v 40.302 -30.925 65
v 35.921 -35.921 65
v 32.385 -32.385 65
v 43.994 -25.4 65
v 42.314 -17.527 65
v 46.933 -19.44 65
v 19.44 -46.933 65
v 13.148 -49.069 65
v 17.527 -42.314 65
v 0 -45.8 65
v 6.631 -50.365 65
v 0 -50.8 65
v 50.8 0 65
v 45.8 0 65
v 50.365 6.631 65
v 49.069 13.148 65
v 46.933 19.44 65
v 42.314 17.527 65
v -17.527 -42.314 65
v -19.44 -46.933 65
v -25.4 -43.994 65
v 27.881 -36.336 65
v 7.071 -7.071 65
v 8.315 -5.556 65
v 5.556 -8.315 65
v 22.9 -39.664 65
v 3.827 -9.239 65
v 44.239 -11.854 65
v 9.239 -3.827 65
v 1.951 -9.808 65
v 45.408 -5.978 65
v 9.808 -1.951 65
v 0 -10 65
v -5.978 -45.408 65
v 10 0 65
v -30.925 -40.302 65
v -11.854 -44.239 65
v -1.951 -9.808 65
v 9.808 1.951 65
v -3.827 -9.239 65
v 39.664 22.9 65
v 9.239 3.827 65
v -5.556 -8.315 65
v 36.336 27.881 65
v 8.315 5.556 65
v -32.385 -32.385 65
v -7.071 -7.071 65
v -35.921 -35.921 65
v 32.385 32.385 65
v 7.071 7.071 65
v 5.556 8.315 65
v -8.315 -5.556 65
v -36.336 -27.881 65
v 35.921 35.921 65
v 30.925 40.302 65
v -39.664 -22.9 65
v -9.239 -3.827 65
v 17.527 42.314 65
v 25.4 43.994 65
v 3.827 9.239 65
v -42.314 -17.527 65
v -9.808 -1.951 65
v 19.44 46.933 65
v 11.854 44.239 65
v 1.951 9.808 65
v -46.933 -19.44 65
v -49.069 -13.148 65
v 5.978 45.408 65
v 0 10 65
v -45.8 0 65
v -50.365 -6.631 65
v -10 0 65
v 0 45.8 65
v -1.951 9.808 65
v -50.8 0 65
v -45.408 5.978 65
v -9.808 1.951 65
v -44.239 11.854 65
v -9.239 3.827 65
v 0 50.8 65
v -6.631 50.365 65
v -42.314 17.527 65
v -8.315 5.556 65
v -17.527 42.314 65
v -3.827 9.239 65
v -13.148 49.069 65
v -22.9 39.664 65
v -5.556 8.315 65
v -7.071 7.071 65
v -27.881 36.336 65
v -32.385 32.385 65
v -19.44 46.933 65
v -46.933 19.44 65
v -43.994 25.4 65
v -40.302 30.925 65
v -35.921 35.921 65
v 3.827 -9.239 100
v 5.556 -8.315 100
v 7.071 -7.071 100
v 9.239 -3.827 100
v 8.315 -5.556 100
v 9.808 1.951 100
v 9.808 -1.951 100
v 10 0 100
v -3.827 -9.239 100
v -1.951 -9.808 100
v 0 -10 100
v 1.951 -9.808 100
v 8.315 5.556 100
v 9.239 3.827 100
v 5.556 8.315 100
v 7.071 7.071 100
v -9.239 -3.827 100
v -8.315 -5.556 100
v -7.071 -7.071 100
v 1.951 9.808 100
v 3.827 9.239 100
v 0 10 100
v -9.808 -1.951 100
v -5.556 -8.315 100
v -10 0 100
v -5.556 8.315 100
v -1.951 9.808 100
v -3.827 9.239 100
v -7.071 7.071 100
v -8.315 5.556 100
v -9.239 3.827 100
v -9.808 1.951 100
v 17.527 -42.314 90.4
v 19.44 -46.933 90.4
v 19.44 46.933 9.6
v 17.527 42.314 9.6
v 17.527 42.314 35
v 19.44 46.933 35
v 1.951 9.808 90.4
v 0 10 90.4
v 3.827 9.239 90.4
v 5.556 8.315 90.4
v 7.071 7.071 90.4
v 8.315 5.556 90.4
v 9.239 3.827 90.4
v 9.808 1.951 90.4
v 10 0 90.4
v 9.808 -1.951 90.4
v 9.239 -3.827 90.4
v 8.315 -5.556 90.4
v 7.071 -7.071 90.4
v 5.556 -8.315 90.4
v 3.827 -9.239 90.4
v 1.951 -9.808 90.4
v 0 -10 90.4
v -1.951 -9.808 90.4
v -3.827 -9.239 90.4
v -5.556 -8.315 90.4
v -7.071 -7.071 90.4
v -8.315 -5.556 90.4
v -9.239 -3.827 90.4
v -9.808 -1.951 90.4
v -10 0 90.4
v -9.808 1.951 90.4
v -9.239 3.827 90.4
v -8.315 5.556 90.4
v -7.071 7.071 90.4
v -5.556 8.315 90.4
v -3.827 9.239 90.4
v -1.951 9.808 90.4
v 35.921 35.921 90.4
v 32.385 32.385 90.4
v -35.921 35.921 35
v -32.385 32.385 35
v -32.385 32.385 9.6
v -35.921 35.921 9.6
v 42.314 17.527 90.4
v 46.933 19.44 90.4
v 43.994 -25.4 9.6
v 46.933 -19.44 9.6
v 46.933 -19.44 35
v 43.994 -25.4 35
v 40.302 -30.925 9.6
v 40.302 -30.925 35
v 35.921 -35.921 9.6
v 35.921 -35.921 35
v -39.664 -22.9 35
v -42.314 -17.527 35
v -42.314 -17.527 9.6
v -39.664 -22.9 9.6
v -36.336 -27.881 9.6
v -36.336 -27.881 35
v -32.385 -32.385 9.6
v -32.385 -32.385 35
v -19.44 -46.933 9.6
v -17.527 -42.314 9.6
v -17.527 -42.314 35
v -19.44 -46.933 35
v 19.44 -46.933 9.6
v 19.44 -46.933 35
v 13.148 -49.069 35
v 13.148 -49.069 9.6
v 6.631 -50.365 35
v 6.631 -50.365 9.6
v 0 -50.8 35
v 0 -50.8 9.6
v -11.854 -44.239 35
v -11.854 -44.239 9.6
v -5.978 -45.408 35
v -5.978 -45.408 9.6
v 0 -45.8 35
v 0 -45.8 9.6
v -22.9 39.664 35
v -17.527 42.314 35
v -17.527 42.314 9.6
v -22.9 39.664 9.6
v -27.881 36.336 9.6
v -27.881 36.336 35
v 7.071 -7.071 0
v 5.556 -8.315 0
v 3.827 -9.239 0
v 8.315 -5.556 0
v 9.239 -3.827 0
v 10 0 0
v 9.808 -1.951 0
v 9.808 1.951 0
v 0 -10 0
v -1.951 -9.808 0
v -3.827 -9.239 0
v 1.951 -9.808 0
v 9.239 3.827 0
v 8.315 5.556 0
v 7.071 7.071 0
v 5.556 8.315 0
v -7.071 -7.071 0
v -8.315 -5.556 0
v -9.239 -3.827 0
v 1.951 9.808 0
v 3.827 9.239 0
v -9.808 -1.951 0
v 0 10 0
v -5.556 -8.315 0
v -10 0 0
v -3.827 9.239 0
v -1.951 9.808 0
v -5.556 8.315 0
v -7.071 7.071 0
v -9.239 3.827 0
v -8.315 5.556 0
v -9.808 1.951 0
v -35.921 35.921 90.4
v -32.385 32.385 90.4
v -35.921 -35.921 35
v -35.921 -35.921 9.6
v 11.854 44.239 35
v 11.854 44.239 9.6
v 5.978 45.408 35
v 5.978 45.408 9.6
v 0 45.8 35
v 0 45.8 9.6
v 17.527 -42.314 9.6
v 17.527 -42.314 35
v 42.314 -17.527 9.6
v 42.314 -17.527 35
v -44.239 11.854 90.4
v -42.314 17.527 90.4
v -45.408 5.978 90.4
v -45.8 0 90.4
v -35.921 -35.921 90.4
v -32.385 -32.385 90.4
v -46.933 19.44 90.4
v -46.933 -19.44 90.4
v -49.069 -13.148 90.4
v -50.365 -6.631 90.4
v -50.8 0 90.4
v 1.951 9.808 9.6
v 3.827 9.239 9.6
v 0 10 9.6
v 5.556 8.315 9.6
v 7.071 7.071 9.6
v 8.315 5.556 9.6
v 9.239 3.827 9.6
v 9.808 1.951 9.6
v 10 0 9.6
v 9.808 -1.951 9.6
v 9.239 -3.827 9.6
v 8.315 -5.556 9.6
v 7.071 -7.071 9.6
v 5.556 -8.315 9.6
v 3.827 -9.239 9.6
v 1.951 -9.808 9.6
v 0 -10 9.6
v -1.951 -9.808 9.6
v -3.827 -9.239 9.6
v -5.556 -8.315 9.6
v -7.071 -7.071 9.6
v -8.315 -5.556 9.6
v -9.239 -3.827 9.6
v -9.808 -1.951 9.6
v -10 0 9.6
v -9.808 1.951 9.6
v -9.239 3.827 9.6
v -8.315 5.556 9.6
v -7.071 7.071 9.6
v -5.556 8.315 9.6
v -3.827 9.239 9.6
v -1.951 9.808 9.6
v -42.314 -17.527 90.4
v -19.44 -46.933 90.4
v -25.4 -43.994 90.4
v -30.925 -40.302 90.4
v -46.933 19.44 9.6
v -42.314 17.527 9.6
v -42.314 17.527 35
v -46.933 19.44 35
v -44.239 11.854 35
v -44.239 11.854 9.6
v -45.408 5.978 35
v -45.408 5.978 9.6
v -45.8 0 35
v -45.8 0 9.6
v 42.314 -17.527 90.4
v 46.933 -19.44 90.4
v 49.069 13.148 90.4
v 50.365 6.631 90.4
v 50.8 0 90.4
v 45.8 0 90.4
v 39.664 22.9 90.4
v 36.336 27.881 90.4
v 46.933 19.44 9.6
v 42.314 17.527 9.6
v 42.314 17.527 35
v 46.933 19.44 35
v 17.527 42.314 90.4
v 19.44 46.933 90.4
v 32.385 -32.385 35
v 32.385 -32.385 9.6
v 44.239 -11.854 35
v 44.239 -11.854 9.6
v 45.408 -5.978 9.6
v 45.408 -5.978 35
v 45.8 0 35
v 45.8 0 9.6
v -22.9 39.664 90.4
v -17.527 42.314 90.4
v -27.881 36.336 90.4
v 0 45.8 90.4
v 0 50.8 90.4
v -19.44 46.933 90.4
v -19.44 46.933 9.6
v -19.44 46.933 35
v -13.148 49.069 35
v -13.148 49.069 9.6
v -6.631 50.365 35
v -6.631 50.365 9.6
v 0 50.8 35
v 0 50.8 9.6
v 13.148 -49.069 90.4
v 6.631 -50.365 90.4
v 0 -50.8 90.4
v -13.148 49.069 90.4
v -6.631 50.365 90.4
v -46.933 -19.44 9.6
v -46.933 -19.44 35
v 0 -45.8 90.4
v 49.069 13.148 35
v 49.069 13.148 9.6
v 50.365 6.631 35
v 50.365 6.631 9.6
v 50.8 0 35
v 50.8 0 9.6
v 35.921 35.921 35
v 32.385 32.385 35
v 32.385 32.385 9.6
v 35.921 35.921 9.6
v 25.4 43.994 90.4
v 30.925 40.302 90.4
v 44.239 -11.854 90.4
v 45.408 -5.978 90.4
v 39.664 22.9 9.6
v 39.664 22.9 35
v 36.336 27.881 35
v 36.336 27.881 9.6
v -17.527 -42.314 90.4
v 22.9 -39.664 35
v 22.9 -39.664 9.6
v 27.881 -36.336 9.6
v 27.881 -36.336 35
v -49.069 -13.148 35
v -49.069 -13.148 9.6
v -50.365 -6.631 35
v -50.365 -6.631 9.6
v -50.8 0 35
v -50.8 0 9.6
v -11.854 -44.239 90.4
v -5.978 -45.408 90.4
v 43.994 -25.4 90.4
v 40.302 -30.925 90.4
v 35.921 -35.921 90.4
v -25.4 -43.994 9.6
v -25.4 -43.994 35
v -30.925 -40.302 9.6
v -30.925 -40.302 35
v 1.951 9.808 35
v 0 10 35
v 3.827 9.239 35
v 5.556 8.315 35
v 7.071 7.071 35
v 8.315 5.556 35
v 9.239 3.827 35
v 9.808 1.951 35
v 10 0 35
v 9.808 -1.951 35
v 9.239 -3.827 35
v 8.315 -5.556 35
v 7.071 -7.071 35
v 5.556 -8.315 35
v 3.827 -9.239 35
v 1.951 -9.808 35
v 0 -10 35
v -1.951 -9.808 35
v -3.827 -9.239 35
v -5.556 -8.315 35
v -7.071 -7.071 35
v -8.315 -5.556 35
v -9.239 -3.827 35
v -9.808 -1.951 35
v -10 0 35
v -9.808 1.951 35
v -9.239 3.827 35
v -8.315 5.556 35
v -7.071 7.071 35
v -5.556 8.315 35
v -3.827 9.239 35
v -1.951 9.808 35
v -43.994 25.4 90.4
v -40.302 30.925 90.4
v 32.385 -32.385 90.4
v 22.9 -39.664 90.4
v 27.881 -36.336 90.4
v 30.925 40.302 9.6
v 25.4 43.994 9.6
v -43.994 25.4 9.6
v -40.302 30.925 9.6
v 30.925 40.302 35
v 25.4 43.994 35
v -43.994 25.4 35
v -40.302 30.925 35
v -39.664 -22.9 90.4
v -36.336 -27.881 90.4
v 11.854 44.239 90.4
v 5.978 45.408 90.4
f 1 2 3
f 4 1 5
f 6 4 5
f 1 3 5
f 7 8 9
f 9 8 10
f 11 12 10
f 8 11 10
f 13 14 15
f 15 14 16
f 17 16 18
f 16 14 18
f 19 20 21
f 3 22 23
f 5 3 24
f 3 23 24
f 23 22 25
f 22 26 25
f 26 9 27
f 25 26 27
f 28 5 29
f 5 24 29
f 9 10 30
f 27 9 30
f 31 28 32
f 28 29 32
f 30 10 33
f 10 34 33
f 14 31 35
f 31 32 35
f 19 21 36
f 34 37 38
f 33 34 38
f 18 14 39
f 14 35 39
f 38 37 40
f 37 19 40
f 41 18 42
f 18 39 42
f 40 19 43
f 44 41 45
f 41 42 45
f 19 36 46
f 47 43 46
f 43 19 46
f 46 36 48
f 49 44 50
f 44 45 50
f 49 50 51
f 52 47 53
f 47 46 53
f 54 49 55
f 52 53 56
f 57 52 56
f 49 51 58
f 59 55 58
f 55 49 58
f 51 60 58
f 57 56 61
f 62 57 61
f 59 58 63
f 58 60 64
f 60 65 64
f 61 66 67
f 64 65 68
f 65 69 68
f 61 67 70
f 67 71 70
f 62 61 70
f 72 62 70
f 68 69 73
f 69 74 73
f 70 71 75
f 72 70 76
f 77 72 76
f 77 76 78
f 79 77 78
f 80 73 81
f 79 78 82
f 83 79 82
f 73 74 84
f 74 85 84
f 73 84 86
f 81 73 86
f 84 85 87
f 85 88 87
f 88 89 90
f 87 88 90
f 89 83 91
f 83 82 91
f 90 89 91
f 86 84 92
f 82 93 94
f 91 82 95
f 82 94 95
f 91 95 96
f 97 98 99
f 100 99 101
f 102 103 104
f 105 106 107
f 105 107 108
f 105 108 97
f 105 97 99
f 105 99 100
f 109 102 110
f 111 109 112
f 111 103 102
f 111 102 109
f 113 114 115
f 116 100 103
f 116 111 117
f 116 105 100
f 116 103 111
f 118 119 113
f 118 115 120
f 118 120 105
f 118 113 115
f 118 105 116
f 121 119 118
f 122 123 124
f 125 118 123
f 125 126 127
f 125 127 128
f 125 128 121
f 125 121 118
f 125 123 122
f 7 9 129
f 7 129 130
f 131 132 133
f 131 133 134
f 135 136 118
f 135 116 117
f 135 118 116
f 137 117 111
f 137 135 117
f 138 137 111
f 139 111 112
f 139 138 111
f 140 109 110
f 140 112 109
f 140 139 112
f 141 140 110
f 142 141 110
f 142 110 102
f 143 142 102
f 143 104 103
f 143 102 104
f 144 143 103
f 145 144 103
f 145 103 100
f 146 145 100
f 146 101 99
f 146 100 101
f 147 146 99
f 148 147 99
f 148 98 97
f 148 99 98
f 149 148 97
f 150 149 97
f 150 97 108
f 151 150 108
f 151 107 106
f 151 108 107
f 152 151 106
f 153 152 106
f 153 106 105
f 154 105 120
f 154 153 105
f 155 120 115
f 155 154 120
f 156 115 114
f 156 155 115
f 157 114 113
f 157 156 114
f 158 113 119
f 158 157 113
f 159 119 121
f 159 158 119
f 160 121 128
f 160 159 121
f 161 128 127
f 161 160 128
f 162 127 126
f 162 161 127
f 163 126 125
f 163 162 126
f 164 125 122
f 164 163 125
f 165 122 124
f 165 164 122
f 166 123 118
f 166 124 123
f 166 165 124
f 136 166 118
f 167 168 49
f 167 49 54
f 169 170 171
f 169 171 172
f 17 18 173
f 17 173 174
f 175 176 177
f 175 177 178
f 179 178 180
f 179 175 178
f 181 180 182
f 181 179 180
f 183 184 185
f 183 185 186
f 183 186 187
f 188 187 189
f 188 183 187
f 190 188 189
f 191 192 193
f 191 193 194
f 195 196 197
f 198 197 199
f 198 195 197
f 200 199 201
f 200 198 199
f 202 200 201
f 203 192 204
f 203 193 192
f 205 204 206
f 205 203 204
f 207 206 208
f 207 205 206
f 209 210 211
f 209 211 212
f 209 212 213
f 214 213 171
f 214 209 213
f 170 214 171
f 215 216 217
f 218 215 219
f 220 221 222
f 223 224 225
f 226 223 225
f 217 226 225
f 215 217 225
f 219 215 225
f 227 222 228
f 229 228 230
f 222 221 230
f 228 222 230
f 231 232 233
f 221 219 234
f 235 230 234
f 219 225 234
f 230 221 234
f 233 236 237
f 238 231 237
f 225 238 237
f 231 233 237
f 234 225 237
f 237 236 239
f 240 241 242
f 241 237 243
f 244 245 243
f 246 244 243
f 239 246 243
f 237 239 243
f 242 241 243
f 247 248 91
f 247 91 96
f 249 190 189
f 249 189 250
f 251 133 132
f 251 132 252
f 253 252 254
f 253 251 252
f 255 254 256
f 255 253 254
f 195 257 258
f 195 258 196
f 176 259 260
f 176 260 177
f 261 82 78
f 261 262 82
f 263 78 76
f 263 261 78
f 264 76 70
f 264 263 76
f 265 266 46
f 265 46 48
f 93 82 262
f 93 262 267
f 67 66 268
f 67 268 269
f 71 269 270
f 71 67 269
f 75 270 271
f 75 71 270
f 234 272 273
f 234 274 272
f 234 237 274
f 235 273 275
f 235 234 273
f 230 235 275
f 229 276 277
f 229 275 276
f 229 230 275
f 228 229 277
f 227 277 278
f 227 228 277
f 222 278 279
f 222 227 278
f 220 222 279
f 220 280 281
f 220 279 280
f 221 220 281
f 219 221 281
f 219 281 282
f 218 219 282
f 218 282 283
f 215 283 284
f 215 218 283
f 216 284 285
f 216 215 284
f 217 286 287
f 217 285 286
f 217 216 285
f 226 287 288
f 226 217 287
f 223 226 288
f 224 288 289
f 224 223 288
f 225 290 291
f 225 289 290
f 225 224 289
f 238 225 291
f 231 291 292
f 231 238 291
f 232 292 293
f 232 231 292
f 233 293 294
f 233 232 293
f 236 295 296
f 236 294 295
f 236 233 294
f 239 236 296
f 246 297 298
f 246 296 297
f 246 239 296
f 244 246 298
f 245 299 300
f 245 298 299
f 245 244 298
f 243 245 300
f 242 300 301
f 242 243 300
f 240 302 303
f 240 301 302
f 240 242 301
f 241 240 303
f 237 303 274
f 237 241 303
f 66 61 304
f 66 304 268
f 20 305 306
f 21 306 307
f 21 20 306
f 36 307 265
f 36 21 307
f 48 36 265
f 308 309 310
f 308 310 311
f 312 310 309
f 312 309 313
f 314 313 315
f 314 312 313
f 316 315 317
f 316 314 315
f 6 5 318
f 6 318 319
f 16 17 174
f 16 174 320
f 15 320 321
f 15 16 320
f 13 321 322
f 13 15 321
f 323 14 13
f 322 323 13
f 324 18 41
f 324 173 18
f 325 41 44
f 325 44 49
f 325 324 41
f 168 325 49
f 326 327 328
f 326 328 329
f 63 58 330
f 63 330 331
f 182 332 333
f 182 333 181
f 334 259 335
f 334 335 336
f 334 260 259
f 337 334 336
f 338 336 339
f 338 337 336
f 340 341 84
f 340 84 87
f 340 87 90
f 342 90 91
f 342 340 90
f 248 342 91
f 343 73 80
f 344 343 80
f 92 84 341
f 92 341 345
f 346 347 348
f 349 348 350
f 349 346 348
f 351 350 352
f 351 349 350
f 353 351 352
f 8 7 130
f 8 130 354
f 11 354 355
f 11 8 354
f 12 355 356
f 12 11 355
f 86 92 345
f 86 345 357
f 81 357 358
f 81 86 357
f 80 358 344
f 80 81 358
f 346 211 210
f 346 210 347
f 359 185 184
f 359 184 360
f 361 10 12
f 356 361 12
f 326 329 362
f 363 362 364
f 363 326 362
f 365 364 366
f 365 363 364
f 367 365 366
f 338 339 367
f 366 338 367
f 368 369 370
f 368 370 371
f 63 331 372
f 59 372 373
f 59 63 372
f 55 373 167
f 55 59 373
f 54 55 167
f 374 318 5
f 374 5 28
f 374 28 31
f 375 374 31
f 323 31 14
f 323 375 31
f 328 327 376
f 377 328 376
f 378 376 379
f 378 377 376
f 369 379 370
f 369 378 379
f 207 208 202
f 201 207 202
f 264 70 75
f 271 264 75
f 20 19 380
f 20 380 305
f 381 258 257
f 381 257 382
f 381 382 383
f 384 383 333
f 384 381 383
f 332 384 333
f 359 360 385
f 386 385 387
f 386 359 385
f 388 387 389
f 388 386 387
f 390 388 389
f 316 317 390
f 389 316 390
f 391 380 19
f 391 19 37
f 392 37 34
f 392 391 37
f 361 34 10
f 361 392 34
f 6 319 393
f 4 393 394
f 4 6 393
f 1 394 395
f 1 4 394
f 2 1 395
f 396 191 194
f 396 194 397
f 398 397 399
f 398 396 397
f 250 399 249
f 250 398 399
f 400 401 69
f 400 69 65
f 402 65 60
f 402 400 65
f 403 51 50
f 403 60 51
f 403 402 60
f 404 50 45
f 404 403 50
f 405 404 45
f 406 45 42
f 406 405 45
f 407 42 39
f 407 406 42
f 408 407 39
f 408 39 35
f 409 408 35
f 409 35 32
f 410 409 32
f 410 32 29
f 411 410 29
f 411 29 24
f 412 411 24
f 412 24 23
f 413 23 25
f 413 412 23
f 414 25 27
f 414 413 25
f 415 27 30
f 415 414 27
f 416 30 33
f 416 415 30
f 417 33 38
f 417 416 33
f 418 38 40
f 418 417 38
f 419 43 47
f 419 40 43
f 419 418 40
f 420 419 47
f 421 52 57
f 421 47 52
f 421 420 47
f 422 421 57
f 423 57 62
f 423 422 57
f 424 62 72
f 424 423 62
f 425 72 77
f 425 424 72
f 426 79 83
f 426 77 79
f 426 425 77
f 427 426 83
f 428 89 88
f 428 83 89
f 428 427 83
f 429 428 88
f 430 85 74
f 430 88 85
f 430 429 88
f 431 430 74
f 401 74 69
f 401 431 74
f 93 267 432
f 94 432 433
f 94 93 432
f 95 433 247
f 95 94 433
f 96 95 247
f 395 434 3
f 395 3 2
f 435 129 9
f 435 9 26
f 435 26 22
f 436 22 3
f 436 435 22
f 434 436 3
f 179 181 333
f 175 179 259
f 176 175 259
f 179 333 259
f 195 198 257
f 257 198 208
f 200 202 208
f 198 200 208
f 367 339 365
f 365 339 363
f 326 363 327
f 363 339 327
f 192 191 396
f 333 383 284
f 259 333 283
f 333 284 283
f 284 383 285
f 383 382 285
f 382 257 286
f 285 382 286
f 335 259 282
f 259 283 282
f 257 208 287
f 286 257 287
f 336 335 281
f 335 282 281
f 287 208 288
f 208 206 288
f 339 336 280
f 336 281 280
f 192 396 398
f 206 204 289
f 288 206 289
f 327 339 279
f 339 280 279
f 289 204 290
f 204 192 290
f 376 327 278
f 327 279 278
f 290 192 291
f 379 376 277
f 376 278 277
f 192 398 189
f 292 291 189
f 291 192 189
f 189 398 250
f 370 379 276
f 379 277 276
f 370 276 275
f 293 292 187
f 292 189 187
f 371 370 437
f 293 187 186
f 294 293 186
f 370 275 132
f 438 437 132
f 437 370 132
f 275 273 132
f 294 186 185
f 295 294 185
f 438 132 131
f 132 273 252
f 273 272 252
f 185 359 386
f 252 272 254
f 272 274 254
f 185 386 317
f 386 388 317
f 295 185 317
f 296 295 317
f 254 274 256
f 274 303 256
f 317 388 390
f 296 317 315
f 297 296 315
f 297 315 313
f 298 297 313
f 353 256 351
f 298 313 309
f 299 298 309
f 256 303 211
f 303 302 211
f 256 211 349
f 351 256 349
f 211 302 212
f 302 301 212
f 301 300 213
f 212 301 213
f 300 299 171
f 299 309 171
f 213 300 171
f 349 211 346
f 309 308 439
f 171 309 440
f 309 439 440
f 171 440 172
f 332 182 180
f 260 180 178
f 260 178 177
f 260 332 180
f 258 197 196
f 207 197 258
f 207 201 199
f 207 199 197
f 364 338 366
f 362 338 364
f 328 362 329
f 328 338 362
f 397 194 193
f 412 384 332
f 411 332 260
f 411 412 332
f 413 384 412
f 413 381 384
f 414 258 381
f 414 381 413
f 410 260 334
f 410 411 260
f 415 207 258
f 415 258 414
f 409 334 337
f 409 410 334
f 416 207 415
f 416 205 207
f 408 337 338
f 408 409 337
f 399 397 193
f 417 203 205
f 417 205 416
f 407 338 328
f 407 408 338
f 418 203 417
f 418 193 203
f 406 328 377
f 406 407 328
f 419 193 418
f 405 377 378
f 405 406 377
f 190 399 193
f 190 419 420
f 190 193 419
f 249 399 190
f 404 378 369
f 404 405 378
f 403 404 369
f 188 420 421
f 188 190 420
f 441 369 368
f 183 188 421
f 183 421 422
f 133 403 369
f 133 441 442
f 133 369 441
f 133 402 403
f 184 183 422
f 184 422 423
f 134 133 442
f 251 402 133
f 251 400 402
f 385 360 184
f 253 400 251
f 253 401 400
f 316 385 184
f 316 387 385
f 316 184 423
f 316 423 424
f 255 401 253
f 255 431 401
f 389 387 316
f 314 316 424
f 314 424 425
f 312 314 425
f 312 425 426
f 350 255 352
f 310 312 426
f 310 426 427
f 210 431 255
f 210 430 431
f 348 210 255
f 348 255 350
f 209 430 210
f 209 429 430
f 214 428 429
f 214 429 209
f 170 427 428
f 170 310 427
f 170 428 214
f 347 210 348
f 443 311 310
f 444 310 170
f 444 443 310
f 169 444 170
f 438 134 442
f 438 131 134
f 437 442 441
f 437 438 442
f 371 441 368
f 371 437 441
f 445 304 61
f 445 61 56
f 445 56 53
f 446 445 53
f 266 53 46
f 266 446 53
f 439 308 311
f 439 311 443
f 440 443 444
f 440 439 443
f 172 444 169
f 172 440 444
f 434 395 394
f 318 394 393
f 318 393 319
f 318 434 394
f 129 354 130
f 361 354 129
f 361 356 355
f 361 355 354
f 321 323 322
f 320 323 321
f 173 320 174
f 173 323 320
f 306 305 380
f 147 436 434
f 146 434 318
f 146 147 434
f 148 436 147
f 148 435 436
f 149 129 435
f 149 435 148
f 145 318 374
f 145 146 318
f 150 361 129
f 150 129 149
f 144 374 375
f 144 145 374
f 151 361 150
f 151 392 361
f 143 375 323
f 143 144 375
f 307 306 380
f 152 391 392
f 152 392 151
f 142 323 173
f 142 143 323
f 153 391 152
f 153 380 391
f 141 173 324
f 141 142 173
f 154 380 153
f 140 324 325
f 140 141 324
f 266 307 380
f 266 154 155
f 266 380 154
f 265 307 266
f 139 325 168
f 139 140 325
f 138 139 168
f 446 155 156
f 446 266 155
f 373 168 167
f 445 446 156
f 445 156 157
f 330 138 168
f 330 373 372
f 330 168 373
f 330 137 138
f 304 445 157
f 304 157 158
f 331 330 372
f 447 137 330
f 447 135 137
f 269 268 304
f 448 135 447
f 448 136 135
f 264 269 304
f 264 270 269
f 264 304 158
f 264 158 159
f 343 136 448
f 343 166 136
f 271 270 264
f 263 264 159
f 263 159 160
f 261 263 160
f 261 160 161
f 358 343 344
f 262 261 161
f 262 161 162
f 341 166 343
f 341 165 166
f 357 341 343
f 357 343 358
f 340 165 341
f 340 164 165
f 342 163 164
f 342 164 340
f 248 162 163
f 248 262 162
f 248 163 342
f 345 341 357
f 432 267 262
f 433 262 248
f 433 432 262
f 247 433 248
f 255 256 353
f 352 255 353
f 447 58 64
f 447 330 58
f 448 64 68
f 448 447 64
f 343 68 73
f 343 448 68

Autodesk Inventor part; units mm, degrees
ref_plane "YZ Plane" through (0, 0, 0) normal (1, 0, 0) x (0, 1, 0)
ref_plane "XZ Plane" through (0, 0, 0) normal (0, 1, 0) x (-1, 0, 0)
ref_plane "XY Plane" through (0, 0, 0) normal (0, 0, 1) x (1, 0, 0)
sketch "Esboço1" plane through (0, 0, 0) normal (1, 0, 0) x (0, 1, 0)
  line L0 (0, 0) -> (0, 100)
  line L1 (0, 100) -> (10, 100)
  line L2 (10, 100) -> (10, 90.4)
  line L3 (10, 90.4) -> (50.8, 90.4)
  line L4 (50.8, 90.4) -> (50.8, 65)
  line L5 (50.8, 65) -> (10, 65)
  line L6 (10, 65) -> (10, 35)
  line L7 (10, 35) -> (50.8, 35)
  line L8 (50.8, 35) -> (50.8, 9.6)
  line L9 (50.8, 9.6) -> (10, 9.6)
  line L10 (10, 9.6) -> (10, 0)
  line L11 (10, 0) -> (0, 0)
  line L12 (0, 50) -> (10, 50)
  dimension "d0" = 10
  dimension "d1" = 100
  dimension "d2" = 25.4
  dimension "d3" = 25.4
  dimension "d4" = 15
  dimension "d5" = 15
  dimension "d6" = 50.8
revolve "Revolução1" add sketch "Esboço1" angle 360 about axis through (0, 0, 0) along (0, 0, 1)
thread "Rosca1" size "M1060x8" class "6g" standard "ANSI Metric M Profile" full length
thread "Rosca2" size "M105x6" class "6g" standard "ANSI Metric M Profile" full length
sketch "Esboço4" plane through (0, 0, 90.4) normal (0, 0, 1) x (1, 0, 0)
  circle A0 centre (0, 0) radius 10 projected
  circle A1 centre (0, 0) radius 50.8 projected
  line L0 (0, 0) -> (0, 50.8)
  line L1 (0, 0) -> (0, -50.8)
  line L2 (0, 0) -> (50.8, 0)
  line L3 (0, 0) -> (-50.8, 0)
  line L4 (0, 0) -> (-35.921, 35.921)
  line L5 (0, 0) -> (-19.4403, 46.9331)
  line L6 (0, 0) -> (-46.9331, 19.4403)
  line L7 (0, 0) -> (35.921, 35.921)
  line L8 (0, 0) -> (19.4403, 46.9331)
  line L9 (0, 0) -> (46.9331, 19.4403)
  line L10 (0, 0) -> (-35.921, -35.921)
  line L11 (0, 0) -> (-19.4403, -46.9331)
  line L12 (0, 0) -> (-46.9331, -19.4403)
  line L13 (0, 0) -> (19.4403, -46.9331)
  line L14 (0, 0) -> (35.921, -35.921)
  line L15 (0, 0) -> (46.9331, -19.4403)
  circle A2 centre (0, 0) radius 45.8
  point P0 (-5, 45.5263)
  point P1 (-45.8, 0)
  point P2 (0, -45.8)
  point P3 (45.8, 0)
  point P4 (0, 45.8)
  point P5 (-42.3137, -17.5269)
  point P6 (17.5269, -42.3137)
  point P7 (42.3137, 17.5269)
  point P8 (-17.5269, 42.3137)
  point P9 (17.5269, 42.3137)
  point P10 (42.3137, -17.5269)
  point P11 (32.3855, 32.3855)
  point P12 (32.3855, -32.3855)
  point P13 (-32.3855, 32.3855)
  point P14 (-42.3137, 17.5269)
  point P15 (-32.3855, -32.3855)
  point P16 (-17.5269, -42.3137)
  dimension "d21" = 45
  dimension "d22" = 22.5
  dimension "d23" = 22.5
extrude "Extrusão3" cut sketch "Esboço4" against normal up to surface (80.8 mm away) contours L2 A1 L15 A2 | A2 L7 A1 L9 | L14 A1 L13 A2 | L0 A1 L8 A2 | L1 A1 L11 A2 | L3 A1 L6 A2 | L4 A1 L5 A2 | L10 A1 L12 A2
equation "\"d3\" = d2"
equation "\"d5\" = d4"
equation "\"d22\" = 0.5 * d21"
equation "\"d23\" = d22"
properties part number "Coletor - Hand"
